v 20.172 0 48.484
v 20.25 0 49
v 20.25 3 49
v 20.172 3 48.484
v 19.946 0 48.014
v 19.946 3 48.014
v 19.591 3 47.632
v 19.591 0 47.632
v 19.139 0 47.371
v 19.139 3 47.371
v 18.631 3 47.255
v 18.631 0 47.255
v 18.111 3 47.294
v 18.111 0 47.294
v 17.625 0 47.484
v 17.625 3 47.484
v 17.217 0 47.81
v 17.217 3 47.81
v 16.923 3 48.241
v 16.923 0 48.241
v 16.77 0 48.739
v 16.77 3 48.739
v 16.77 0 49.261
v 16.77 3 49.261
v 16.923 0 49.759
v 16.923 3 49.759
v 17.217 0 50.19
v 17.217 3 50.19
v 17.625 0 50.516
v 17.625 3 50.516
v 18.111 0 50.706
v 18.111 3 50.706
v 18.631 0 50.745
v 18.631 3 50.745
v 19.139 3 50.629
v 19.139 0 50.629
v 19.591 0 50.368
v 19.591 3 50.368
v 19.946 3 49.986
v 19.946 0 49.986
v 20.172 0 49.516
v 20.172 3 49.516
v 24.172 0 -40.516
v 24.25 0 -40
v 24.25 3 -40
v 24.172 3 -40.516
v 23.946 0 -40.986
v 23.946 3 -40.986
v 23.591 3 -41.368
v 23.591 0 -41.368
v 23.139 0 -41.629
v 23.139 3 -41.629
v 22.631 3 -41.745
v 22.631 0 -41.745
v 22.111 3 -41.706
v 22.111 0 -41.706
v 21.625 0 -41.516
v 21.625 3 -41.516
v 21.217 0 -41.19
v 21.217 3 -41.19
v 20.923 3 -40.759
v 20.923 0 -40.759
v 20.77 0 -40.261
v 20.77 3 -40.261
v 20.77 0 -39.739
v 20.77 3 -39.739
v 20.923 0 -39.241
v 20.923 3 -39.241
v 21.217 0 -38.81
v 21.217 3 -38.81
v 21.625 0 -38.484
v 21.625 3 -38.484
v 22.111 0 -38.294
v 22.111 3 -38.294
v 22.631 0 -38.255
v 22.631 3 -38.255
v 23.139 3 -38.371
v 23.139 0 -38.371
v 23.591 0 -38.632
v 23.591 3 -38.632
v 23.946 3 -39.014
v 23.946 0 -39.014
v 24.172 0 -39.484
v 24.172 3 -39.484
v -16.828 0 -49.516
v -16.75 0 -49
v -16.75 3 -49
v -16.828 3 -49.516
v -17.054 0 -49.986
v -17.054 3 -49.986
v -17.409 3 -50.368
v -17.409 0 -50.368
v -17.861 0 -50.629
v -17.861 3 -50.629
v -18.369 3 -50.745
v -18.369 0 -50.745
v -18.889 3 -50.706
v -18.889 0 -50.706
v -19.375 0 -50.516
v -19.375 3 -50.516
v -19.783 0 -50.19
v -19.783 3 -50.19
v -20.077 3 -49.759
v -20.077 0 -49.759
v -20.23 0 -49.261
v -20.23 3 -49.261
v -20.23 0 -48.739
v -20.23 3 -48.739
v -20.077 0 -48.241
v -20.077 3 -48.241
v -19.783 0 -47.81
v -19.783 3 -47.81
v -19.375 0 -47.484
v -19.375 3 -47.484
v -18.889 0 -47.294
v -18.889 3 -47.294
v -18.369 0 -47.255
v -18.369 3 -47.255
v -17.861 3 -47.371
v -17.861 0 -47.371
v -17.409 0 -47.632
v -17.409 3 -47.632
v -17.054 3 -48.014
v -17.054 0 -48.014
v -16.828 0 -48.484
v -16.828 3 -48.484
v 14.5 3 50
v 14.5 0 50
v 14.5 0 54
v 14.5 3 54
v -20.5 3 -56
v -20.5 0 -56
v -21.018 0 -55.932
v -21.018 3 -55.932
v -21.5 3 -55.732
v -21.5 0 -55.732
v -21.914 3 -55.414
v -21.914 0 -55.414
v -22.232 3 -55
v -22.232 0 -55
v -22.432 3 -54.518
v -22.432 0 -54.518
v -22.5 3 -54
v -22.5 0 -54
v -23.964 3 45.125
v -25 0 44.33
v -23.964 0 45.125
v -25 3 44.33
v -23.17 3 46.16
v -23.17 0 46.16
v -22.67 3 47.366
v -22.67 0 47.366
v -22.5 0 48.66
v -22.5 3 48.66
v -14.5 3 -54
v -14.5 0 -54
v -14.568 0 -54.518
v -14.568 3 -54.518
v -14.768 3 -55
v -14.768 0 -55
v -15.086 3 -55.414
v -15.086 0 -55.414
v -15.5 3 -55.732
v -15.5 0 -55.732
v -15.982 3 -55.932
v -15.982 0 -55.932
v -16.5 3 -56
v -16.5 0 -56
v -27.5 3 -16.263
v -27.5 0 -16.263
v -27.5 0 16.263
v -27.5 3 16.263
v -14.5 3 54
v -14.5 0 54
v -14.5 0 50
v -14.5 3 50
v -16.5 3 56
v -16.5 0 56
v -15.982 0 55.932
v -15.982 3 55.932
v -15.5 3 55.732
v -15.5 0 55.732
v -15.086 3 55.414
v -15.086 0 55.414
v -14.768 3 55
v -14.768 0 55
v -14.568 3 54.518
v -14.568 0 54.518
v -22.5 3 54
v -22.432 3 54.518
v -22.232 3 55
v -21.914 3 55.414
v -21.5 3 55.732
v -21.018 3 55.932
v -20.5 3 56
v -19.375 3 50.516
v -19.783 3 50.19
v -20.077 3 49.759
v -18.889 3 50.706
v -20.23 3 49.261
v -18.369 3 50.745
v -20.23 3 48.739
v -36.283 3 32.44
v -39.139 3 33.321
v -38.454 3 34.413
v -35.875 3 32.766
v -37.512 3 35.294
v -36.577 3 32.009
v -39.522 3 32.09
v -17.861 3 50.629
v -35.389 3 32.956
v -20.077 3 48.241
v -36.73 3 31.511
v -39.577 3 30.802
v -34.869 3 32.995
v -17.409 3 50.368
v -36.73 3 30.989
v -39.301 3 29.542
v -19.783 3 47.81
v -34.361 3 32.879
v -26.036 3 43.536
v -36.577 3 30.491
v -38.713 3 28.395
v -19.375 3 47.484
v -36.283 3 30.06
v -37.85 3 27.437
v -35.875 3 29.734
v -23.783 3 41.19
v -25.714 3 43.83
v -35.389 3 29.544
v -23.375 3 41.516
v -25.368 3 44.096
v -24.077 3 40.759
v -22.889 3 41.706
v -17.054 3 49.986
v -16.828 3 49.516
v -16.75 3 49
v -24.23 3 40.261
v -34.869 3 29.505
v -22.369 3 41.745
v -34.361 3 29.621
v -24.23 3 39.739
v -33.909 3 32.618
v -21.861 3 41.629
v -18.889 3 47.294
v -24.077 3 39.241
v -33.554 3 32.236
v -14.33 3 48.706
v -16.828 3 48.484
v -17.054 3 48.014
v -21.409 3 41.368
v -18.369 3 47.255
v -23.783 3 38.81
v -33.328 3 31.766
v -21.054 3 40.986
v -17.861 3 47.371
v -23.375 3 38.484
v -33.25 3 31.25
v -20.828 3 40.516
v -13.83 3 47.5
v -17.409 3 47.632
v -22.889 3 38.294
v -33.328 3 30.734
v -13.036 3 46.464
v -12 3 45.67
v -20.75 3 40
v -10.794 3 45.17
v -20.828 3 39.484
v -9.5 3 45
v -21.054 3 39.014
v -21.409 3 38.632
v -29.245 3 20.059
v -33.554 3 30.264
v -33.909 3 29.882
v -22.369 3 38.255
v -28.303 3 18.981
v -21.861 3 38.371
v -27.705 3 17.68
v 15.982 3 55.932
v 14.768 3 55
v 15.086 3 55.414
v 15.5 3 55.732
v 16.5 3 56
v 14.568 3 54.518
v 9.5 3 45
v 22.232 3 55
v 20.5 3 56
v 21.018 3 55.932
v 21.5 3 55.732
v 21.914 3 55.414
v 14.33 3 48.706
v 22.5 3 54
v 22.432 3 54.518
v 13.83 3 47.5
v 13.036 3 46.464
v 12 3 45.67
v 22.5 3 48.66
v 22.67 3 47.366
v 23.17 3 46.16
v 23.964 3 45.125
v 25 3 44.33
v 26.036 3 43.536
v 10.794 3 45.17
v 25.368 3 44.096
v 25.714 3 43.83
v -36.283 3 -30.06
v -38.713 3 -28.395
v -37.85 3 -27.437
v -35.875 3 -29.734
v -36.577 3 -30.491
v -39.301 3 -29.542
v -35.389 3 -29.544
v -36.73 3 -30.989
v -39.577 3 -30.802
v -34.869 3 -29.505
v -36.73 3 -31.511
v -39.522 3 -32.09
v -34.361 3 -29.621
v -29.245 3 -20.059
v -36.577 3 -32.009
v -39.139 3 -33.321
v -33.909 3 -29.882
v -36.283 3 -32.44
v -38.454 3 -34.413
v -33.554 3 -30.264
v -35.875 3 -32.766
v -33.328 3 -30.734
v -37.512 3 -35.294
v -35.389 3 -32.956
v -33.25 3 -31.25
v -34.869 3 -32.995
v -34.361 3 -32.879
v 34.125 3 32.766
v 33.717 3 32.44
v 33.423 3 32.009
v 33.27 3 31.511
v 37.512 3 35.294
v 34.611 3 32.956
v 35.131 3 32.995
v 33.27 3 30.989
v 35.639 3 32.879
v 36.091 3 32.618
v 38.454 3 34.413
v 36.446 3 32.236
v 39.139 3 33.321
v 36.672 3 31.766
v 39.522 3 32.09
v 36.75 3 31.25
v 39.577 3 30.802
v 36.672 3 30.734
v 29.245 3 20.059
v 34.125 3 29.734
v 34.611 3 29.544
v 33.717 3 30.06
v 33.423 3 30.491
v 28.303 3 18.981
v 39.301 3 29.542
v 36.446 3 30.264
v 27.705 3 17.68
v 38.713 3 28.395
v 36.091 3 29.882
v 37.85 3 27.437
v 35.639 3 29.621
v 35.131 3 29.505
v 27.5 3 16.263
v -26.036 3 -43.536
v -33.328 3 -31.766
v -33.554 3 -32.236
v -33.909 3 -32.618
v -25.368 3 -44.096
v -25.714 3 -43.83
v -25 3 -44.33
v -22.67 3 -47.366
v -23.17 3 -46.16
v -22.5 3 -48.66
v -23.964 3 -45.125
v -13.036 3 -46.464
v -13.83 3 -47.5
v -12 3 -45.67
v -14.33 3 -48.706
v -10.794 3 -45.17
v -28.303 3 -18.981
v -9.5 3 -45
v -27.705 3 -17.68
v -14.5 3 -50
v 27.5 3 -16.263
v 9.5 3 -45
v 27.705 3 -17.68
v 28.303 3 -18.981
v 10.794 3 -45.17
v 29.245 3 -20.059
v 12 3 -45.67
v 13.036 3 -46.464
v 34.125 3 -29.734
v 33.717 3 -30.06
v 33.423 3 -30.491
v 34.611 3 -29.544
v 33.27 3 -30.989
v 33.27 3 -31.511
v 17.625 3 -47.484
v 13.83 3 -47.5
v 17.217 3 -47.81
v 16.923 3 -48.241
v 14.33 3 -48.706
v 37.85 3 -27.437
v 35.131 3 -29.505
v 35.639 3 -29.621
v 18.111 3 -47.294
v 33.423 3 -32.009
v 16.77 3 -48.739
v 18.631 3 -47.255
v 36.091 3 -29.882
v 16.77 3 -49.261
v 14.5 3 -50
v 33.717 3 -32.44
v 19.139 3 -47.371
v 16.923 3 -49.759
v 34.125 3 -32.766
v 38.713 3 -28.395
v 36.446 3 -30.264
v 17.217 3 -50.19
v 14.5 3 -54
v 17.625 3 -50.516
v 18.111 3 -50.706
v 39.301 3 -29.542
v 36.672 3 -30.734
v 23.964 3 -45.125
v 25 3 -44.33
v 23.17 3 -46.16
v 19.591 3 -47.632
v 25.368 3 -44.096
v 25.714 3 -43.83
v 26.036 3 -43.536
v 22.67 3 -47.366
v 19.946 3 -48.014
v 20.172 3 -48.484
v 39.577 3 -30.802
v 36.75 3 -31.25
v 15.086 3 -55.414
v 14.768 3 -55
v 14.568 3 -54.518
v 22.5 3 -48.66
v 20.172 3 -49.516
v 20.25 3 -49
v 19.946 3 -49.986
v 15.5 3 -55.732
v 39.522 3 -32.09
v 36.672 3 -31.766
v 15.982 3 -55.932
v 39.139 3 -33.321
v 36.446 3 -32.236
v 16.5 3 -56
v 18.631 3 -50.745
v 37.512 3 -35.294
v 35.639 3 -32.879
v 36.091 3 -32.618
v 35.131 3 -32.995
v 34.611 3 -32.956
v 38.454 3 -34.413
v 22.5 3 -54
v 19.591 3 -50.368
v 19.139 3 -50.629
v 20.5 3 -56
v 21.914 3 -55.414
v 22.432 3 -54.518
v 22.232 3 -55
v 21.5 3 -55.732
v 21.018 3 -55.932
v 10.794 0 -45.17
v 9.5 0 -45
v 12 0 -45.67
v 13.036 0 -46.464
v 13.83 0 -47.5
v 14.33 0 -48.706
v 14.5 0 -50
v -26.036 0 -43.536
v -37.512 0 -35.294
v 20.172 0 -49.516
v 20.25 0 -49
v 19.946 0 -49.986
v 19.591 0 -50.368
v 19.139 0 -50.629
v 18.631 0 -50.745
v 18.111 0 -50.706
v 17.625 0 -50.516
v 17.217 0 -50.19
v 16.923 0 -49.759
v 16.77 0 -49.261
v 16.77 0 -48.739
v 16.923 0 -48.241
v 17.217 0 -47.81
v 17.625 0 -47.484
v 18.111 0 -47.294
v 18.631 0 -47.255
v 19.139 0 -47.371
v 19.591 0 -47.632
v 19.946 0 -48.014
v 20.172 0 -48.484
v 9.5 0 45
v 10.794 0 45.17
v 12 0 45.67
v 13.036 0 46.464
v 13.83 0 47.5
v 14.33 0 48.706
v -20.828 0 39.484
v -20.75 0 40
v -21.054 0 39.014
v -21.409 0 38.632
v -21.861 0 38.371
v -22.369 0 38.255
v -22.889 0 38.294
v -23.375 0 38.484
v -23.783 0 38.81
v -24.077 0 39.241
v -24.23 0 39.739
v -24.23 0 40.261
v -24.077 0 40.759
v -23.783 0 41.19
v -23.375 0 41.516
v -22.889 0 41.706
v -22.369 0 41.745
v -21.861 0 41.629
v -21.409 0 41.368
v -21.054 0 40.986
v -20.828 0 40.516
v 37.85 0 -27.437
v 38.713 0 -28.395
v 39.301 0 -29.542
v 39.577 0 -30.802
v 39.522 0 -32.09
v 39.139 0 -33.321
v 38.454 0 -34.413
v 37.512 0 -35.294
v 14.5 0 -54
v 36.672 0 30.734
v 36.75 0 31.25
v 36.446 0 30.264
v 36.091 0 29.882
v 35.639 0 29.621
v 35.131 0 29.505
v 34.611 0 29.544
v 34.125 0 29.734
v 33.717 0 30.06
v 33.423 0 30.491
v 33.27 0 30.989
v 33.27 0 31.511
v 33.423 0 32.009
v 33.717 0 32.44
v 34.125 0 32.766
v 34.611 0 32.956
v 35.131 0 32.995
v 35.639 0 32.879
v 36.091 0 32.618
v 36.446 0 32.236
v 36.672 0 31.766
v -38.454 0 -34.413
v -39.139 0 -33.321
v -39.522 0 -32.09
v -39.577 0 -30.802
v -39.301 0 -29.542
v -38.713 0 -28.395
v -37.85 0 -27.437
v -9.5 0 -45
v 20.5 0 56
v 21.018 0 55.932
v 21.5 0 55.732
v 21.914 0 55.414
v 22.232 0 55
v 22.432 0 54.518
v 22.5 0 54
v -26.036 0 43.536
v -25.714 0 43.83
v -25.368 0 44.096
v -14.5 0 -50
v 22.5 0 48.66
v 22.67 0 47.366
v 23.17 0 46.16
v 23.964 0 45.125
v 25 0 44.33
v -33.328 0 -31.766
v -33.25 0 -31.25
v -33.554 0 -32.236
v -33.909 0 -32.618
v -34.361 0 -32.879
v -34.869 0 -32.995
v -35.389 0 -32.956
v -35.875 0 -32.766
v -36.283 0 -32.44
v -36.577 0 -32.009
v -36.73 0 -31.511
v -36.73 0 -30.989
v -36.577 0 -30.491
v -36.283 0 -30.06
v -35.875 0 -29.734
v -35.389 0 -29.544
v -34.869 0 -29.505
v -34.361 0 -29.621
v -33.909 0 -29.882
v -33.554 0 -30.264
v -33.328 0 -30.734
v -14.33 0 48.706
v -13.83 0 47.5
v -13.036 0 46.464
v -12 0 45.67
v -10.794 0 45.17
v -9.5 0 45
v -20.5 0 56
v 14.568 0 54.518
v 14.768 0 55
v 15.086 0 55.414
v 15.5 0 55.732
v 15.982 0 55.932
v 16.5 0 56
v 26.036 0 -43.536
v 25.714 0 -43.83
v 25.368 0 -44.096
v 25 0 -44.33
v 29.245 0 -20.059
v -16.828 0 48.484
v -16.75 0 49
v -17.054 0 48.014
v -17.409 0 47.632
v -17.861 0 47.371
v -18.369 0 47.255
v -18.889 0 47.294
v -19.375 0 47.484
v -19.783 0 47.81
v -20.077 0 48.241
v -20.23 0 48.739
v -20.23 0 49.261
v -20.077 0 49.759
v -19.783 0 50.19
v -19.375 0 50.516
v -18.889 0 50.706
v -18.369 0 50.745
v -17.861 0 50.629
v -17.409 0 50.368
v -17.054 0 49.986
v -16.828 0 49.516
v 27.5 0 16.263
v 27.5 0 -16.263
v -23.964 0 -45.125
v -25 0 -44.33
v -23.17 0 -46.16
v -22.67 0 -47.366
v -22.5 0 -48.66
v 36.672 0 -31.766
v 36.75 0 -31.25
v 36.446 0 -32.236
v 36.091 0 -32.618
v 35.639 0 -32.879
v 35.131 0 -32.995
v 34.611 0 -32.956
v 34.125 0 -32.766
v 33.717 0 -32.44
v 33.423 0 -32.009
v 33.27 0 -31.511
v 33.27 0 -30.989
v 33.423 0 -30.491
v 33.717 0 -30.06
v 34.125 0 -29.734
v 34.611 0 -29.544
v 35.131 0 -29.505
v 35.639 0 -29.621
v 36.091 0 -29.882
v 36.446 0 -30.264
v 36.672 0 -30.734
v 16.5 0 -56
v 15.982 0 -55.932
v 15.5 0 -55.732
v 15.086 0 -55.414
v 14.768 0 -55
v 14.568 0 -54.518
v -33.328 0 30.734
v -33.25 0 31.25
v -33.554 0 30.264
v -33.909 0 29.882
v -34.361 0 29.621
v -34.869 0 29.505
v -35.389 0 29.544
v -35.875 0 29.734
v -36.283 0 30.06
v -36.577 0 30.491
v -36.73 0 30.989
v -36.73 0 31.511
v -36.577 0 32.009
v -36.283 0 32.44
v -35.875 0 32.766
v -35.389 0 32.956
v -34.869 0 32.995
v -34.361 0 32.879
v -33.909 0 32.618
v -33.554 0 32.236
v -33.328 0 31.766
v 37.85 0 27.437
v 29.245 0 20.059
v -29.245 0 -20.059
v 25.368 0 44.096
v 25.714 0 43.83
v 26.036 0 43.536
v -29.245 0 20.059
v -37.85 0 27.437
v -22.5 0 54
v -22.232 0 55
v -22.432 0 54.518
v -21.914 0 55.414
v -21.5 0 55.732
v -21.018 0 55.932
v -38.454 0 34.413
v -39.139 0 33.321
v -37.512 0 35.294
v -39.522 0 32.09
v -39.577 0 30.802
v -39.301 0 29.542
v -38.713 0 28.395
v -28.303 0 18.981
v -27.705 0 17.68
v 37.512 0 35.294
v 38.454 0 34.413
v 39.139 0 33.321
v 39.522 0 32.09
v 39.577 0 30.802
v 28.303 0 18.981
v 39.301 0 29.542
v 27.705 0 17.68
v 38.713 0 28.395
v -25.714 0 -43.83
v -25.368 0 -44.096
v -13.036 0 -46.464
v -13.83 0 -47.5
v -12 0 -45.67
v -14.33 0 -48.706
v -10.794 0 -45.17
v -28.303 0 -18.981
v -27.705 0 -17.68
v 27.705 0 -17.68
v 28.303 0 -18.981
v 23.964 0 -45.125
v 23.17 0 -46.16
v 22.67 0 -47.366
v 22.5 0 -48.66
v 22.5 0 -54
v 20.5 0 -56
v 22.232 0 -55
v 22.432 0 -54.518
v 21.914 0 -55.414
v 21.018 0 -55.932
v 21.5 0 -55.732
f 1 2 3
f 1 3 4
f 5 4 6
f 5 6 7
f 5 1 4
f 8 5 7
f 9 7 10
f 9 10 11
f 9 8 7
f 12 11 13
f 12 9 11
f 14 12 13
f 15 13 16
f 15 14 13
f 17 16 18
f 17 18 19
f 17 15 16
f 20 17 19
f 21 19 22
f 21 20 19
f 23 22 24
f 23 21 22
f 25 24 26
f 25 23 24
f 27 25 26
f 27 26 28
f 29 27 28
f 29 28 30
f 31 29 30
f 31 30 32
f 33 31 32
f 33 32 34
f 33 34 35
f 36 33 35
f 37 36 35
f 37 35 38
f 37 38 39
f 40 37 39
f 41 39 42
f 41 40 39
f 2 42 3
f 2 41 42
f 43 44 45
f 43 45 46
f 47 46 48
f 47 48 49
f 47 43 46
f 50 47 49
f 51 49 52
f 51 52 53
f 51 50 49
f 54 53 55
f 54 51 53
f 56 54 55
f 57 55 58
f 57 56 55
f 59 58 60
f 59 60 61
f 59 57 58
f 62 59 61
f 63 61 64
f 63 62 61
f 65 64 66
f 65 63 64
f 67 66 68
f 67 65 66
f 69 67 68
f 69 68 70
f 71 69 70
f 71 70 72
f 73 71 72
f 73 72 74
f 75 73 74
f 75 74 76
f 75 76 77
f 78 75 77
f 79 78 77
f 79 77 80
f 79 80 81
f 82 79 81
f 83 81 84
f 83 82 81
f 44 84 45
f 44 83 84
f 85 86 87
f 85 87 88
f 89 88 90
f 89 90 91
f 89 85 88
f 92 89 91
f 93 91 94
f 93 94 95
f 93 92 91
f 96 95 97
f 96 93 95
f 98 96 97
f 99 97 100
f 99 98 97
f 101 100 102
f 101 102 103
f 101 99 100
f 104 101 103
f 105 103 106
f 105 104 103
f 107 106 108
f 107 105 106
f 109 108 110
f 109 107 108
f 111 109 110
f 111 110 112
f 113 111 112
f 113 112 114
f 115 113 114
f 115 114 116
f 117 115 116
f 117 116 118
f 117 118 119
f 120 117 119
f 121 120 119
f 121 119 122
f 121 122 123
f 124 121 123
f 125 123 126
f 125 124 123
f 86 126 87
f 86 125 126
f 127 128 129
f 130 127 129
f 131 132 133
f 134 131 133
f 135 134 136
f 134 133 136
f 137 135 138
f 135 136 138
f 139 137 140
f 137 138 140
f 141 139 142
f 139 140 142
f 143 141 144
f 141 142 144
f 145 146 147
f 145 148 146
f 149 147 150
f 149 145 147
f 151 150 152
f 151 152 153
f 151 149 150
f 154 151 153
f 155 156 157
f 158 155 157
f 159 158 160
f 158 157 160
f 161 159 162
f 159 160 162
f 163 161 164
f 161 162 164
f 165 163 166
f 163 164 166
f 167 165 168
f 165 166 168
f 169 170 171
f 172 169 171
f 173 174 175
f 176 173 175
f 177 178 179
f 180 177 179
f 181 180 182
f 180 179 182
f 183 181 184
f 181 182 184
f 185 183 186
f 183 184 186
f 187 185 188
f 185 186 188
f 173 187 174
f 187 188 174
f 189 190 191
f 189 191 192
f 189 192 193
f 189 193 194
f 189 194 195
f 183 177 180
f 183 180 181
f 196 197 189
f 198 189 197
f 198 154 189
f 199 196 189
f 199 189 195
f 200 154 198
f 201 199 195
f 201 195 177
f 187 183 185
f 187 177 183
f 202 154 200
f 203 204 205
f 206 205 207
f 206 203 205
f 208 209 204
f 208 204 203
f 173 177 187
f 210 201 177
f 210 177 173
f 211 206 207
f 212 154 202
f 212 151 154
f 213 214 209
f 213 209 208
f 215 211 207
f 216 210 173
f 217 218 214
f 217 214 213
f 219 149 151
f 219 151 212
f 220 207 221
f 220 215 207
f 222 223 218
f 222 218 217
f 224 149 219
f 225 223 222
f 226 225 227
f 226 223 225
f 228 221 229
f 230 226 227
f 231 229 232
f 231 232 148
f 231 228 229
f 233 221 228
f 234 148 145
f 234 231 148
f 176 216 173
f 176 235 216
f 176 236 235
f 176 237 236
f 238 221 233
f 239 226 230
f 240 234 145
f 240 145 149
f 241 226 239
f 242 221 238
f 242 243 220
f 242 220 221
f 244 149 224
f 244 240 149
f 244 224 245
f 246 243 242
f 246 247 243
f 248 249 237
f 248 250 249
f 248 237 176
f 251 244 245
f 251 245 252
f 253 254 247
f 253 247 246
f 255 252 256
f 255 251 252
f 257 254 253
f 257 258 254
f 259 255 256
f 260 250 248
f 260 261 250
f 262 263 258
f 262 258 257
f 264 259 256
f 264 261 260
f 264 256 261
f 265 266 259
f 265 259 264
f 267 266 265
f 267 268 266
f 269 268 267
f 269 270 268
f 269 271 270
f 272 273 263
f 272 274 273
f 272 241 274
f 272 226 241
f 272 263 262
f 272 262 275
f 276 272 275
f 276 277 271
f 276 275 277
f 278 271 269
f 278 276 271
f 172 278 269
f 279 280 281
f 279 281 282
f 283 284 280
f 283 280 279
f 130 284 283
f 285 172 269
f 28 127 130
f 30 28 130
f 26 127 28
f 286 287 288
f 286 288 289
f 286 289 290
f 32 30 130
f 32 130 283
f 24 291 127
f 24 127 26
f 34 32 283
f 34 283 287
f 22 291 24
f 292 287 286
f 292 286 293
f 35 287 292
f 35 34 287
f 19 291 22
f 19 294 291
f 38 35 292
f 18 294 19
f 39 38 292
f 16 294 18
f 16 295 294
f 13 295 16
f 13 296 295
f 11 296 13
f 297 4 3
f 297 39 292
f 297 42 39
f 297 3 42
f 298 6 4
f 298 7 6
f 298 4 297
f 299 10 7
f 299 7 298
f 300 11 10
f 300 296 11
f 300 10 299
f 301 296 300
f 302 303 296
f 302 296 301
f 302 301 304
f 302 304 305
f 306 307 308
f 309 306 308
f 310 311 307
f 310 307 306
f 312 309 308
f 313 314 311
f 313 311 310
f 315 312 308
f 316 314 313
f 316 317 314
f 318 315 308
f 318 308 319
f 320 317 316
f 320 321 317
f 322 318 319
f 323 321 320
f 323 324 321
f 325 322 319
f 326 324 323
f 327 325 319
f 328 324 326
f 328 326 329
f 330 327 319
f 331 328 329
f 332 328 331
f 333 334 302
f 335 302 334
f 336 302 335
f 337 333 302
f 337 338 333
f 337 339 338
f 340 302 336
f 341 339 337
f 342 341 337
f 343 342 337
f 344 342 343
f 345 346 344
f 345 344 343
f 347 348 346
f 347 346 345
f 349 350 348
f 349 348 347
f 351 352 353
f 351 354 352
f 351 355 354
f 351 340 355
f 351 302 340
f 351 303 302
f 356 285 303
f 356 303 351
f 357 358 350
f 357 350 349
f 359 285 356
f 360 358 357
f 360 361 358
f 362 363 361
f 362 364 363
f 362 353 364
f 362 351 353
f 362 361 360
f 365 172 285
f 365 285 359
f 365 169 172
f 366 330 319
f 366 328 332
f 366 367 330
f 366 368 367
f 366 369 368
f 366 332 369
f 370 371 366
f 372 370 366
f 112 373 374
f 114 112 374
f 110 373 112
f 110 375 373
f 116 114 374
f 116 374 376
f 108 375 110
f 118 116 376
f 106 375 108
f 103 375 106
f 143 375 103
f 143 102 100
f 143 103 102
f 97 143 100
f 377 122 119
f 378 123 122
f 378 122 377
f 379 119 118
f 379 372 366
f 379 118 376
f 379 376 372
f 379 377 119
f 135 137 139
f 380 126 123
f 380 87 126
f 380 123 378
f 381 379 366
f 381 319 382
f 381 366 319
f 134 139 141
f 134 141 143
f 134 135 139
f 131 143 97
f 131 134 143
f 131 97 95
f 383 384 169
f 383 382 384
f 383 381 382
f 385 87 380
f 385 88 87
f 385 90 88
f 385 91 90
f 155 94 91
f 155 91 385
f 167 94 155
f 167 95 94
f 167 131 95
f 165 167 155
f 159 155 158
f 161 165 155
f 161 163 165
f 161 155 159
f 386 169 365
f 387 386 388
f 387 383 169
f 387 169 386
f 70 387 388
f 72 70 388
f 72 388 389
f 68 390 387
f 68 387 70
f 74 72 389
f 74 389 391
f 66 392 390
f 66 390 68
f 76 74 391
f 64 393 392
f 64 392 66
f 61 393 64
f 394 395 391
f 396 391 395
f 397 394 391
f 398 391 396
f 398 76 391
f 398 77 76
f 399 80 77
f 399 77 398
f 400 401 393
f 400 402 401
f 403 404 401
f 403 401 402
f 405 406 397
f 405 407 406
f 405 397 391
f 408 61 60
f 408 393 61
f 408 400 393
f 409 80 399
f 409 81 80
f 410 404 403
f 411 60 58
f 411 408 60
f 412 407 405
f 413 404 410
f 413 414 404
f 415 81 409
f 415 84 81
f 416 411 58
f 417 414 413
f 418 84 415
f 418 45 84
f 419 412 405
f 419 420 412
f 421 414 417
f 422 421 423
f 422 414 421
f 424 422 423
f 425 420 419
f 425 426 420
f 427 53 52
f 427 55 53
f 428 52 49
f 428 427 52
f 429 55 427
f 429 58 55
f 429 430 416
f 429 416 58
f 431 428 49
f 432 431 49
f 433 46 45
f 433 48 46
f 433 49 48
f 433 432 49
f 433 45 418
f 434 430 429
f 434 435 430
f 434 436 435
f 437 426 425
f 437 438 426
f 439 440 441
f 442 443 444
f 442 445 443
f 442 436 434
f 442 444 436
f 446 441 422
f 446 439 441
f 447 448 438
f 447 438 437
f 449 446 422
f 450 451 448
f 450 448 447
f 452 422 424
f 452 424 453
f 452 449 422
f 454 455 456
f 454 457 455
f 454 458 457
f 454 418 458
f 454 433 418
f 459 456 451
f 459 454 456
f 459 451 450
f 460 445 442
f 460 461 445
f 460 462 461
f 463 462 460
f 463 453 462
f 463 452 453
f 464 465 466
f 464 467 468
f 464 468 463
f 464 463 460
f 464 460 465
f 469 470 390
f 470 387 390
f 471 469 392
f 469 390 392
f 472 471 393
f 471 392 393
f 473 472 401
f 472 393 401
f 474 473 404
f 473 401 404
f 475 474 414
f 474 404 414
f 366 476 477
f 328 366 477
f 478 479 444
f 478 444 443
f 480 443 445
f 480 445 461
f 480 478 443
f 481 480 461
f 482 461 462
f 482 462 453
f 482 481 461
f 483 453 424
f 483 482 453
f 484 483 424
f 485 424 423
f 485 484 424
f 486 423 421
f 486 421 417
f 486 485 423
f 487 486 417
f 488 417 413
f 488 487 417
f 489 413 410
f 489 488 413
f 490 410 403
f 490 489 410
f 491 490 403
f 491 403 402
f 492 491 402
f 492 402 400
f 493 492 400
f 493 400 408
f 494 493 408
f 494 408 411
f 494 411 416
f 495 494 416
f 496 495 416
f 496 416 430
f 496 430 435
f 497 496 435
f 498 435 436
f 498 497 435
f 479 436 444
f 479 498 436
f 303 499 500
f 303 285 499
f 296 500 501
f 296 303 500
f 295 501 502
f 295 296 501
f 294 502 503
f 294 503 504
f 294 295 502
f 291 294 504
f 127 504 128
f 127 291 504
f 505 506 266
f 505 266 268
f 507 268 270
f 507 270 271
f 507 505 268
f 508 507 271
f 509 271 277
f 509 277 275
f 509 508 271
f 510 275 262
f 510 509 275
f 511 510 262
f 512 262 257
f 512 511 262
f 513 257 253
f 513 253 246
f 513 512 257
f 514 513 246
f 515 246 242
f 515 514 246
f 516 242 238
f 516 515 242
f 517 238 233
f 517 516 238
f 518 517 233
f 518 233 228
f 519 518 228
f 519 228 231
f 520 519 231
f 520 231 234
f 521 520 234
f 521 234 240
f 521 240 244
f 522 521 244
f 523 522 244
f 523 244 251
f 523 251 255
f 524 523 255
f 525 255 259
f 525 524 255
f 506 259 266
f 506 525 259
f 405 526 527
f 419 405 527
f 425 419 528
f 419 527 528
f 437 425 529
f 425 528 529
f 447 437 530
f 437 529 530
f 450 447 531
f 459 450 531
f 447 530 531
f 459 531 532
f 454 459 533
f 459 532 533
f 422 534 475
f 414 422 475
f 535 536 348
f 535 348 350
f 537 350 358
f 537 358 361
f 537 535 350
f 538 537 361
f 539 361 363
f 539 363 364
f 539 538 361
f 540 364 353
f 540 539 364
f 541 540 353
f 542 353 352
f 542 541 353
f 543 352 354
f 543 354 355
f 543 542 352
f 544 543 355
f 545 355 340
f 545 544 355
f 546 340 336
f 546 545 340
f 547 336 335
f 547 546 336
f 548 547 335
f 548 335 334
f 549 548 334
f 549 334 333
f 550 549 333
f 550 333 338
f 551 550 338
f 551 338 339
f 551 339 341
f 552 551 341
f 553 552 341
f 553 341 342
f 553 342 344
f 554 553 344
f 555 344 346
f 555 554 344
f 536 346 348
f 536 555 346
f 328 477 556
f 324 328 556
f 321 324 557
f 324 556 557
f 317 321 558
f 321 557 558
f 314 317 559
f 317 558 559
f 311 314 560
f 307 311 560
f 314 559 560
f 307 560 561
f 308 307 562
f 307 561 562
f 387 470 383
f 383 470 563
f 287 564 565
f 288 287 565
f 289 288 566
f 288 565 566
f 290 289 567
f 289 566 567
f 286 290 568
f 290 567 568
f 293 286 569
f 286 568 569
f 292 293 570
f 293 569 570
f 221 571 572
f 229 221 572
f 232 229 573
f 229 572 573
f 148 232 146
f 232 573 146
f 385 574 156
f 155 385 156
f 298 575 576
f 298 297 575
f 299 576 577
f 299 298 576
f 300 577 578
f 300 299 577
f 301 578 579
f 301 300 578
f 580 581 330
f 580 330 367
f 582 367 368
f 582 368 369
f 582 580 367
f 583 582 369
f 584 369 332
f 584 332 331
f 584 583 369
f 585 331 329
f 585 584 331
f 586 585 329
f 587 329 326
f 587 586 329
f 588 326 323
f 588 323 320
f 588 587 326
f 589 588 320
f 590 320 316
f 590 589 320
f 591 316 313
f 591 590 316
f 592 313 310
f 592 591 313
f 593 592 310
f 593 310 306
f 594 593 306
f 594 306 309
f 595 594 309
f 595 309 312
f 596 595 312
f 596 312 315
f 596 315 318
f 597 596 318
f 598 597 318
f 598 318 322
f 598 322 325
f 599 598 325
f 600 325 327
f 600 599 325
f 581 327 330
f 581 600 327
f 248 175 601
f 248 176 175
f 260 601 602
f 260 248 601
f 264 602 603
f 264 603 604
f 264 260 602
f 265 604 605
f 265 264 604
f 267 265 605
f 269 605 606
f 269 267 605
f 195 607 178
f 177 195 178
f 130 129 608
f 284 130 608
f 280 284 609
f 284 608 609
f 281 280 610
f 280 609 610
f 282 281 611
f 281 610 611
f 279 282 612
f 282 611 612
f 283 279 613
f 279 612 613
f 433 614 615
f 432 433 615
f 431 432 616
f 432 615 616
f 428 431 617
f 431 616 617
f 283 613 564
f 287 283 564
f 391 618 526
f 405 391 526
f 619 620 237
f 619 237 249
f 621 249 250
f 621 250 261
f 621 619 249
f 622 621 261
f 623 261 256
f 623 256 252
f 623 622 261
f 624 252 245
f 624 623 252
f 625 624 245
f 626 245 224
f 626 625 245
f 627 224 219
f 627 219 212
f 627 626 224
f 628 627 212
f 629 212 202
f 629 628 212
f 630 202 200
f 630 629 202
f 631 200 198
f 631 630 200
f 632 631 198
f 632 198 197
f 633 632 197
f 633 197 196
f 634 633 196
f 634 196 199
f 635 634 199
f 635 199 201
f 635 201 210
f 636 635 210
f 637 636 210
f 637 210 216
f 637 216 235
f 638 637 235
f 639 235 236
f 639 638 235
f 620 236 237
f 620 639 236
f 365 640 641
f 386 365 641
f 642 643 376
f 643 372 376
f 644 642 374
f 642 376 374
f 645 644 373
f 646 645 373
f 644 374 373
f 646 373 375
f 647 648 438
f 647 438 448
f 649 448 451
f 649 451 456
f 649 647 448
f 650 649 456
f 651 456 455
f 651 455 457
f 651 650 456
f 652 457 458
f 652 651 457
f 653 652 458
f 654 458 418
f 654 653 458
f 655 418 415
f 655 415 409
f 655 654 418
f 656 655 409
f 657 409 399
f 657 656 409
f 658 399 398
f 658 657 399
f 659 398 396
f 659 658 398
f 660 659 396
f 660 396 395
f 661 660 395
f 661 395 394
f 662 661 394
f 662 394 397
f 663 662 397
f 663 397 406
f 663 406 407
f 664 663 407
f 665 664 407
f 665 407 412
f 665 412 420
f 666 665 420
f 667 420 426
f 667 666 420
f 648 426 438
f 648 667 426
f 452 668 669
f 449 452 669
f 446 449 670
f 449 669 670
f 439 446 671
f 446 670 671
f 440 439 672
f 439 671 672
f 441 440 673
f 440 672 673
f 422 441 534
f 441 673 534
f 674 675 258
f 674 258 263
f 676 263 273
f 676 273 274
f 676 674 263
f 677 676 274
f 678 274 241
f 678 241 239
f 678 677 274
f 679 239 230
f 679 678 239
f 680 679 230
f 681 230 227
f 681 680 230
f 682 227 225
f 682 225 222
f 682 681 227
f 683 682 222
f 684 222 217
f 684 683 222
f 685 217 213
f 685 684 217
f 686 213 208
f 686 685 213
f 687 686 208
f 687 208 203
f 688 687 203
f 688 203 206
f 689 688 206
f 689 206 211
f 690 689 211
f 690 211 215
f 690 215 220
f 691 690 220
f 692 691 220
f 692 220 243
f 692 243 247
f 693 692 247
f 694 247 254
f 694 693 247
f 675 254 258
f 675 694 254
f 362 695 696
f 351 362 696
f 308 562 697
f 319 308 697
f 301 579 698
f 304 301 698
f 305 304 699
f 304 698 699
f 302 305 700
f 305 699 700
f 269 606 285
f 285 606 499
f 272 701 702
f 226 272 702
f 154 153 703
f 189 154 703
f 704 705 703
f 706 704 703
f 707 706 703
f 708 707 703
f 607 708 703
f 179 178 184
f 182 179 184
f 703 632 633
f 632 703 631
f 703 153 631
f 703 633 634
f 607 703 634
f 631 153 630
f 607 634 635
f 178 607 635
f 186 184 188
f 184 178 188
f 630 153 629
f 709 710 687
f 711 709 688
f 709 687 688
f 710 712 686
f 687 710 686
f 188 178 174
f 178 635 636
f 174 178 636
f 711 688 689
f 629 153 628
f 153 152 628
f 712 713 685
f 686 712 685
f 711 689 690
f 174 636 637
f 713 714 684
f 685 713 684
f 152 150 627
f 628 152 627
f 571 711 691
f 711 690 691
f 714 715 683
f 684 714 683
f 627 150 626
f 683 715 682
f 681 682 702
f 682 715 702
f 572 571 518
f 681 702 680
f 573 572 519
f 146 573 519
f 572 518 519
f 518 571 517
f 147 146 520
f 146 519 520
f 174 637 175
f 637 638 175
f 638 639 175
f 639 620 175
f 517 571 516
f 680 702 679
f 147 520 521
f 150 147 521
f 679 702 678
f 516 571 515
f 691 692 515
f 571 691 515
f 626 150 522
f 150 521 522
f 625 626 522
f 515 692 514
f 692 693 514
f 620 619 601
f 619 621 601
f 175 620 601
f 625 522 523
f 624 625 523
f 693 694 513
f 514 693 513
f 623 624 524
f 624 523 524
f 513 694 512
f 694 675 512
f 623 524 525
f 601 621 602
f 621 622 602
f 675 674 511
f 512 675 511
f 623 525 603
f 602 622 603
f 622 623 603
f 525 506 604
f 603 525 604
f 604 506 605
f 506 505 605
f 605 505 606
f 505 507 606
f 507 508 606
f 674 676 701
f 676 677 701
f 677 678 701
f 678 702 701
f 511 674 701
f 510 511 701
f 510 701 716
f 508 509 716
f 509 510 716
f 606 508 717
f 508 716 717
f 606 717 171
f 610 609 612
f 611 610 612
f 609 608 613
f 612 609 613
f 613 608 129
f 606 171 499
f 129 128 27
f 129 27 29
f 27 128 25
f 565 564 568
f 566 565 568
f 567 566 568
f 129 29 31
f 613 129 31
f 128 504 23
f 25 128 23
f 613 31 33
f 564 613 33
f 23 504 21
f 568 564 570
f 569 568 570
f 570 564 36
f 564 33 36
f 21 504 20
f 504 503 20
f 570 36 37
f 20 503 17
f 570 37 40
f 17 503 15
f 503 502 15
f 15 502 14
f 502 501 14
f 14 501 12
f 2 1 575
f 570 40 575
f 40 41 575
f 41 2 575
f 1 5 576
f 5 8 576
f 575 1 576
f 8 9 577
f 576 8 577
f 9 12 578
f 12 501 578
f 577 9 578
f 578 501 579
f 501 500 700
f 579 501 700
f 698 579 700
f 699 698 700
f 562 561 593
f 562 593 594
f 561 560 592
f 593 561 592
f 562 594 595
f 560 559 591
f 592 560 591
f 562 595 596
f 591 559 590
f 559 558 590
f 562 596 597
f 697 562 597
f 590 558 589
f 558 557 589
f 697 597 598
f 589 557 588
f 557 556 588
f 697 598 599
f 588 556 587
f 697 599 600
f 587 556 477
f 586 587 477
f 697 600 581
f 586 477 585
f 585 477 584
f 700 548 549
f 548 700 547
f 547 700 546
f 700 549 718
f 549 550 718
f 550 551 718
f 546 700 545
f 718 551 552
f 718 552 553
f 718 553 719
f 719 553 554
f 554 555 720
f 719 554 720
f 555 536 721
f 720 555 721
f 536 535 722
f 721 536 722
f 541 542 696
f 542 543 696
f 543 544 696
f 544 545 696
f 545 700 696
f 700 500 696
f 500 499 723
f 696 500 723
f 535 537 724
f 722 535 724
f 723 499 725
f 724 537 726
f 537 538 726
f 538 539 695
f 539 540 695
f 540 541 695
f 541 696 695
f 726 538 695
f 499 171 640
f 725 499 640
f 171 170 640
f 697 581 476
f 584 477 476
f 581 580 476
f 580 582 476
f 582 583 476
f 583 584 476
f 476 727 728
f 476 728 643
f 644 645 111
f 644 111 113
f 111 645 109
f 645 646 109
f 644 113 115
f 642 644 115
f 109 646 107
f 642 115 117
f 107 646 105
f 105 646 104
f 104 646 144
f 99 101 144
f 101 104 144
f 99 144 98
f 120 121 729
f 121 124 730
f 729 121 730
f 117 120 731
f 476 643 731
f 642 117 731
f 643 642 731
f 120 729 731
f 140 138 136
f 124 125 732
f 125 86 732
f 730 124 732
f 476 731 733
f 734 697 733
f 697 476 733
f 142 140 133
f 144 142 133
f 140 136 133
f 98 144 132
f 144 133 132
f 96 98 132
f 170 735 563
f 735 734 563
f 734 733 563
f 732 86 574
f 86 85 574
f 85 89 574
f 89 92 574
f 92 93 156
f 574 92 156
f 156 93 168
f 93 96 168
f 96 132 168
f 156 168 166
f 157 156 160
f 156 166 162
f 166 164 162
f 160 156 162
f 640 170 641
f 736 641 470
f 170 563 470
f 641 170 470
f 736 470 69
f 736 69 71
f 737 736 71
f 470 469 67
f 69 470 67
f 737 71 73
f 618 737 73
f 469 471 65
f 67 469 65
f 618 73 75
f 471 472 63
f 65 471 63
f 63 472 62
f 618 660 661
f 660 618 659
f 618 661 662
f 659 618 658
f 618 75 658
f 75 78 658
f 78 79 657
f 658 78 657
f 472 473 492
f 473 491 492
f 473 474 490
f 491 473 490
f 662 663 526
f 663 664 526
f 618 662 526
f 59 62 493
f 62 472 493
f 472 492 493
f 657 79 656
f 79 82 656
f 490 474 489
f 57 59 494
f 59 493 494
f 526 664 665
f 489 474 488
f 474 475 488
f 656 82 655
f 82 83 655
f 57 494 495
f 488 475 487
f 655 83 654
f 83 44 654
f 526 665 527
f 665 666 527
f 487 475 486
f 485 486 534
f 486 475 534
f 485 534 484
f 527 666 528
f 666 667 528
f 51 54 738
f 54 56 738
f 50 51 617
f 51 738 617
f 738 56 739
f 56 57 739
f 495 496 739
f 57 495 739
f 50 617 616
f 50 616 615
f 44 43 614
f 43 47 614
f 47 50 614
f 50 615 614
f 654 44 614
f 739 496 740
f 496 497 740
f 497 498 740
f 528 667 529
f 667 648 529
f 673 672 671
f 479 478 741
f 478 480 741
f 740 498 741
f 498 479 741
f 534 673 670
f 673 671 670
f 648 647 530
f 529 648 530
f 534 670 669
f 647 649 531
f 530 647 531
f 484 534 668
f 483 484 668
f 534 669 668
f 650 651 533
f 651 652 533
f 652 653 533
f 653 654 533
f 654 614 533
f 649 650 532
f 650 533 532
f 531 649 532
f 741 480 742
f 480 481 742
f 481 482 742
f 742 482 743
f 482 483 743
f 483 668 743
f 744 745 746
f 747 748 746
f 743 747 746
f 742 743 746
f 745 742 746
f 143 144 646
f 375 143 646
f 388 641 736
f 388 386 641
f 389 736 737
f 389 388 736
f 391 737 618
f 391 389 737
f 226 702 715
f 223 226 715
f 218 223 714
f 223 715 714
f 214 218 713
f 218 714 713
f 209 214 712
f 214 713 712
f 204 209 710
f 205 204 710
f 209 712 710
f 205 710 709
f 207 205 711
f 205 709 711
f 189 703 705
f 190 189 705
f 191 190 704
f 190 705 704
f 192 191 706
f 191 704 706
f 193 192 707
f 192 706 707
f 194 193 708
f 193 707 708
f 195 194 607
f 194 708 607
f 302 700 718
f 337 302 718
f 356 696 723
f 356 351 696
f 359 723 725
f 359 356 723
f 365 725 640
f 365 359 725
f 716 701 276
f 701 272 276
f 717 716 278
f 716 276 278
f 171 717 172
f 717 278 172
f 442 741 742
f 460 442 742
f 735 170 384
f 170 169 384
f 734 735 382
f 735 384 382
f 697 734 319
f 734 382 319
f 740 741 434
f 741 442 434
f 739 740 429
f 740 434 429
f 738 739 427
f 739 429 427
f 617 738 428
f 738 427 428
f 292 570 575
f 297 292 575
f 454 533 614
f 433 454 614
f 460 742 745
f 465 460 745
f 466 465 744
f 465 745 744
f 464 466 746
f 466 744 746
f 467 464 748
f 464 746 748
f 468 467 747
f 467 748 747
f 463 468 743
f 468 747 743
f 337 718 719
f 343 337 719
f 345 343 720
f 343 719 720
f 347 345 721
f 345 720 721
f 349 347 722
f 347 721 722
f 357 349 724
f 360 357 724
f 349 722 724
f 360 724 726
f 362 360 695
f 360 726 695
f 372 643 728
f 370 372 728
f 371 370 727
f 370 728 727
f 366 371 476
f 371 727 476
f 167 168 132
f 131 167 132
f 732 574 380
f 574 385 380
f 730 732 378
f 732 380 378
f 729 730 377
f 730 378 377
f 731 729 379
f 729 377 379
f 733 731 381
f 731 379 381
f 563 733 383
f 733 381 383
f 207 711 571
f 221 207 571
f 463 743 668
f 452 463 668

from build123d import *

# Parameters (mm, degrees)
SKETCH_1_R      = 1.75
EXTRUDE_1_DEPTH = 3
FILLET_3_R      = 5


with BuildPart() as part:
    # 草图1 → 凸台-拉伸1 (new body)
    with BuildSketch(Plane(origin=(0, 0, 0), x_dir=(1, 0, 0), z_dir=(0, 1, 0))):
        with BuildLine():
            Line((-27.5, -18.562205506), (-37.85023308, -27.436866757))
            ThreePointArc((-37.85023308, -27.436866757), (-39.59101252, -31.447551796), (-37.512145027, -35.293876989))
            Line((-37.512145027, -35.293876989), (-26.035533906, -43.535533906))
            ThreePointArc((-26.035533906, -43.535533906), (-24.413417162, -44.619397663), (-22.5, -45))
            Line((-22.5, -45), (-22.5, -54))
            ThreePointArc((-22.5, -54), (-21.914213562, -55.414213562), (-20.5, -56))
            Line((-20.5, -56), (-16.5, -56))
            ThreePointArc((-16.5, -56), (-15.085786438, -55.414213562), (-14.5, -54))
            Line((-14.5, -54), (-14.5, -45))
            Line((-14.5, -45), (14.5, -45))
            Line((14.5, -45), (14.5, -54))
            ThreePointArc((14.5, -54), (15.085786438, -55.414213562), (16.5, -56))
            Line((16.5, -56), (20.5, -56))
            ThreePointArc((20.5, -56), (21.914213562, -55.414213562), (22.5, -54))
            Line((22.5, -54), (22.5, -45))
            ThreePointArc((22.5, -45), (24.413417162, -44.619397663), (26.035533906, -43.535533906))
            Line((26.035533906, -43.535533906), (37.512145027, -35.293876989))
            ThreePointArc((37.512145027, -35.293876989), (39.59101252, -31.447551796), (37.85023308, -27.436866757))
            Line((37.85023308, -27.436866757), (27.5, -18.562205506))
            Line((27.5, -18.562205506), (27.5, 18.562205506))
            Line((27.5, 18.562205506), (37.85023308, 27.436866757))
            ThreePointArc((37.85023308, 27.436866757), (39.59101252, 31.447551796), (37.512145027, 35.293876989))
            Line((37.512145027, 35.293876989), (26.035533906, 43.535533906))
            ThreePointArc((26.035533906, 43.535533906), (24.413417162, 44.619397663), (22.5, 45))
            Line((22.5, 45), (22.5, 54))
            ThreePointArc((22.5, 54), (21.914213562, 55.414213562), (20.5, 56))
            Line((20.5, 56), (16.5, 56))
            ThreePointArc((16.5, 56), (15.085786438, 55.414213562), (14.5, 54))
            Line((14.5, 54), (14.5, 45))
            Line((14.5, 45), (-14.5, 45))
            Line((-14.5, 45), (-14.5, 54))
            ThreePointArc((-14.5, 54), (-15.085786438, 55.414213562), (-16.5, 56))
            Line((-16.5, 56), (-20.5, 56))
            ThreePointArc((-20.5, 56), (-21.914213562, 55.414213562), (-22.5, 54))
            Line((-22.5, 54), (-22.5, 45))
            ThreePointArc((-22.5, 45), (-24.413417162, 44.619397663), (-26.035533906, 43.535533906))
            Line((-26.035533906, 43.535533906), (-37.512145027, 35.293876989))
            ThreePointArc((-37.512145027, 35.293876989), (-39.59101252, 31.447551796), (-37.85023308, 27.436866757))
            Line((-37.85023308, 27.436866757), (-27.5, 18.562205506))
            Line((-27.5, 18.562205506), (-27.5, -18.562205506))
        make_face()
        with Locations((-22.5, -40)):
            Circle(SKETCH_1_R, mode=Mode.SUBTRACT)
        with Locations((22.5, 40)):
            Circle(SKETCH_1_R, mode=Mode.SUBTRACT)
        with Locations((-35, -31.25)):
            Circle(SKETCH_1_R, mode=Mode.SUBTRACT)
        with Locations((-18.5, -49)):
            Circle(SKETCH_1_R, mode=Mode.SUBTRACT)
        with Locations((18.5, -49)):
            Circle(SKETCH_1_R, mode=Mode.SUBTRACT)
        with Locations((-35, 31.25)):
            Circle(SKETCH_1_R, mode=Mode.SUBTRACT)
        with Locations((35, -31.25)):
            Circle(SKETCH_1_R, mode=Mode.SUBTRACT)
        with Locations((-18.5, 49)):
            Circle(SKETCH_1_R, mode=Mode.SUBTRACT)
        with Locations((35, 31.25)):
            Circle(SKETCH_1_R, mode=Mode.SUBTRACT)
        with Locations((18.5, 49)):
            Circle(SKETCH_1_R, mode=Mode.SUBTRACT)
    extrude(amount=EXTRUDE_1_DEPTH)

    # 圆角3
    fillet_3_edges = [part.edges().sort_by_distance(p)[0] for p in [
        (-22.5, 1.5, -45),
        (-14.5, 1.5, -45),
        (14.5, 1.5, -45),
        (22.5, 1.5, -45),
        (27.5, 1.5, -18.562205506),
        (27.5, 1.5, 18.562205506),
        (22.5, 1.5, 45),
        (14.5, 1.5, 45),
        (-14.5, 1.5, 45),
        (-22.5, 1.5, 45),
        (-27.5, 1.5, 18.562205506),
        (-27.5, 1.5, -18.562205506),
    ]]
    fillet(fillet_3_edges, radius=FILLET_3_R)


solid = part.part
